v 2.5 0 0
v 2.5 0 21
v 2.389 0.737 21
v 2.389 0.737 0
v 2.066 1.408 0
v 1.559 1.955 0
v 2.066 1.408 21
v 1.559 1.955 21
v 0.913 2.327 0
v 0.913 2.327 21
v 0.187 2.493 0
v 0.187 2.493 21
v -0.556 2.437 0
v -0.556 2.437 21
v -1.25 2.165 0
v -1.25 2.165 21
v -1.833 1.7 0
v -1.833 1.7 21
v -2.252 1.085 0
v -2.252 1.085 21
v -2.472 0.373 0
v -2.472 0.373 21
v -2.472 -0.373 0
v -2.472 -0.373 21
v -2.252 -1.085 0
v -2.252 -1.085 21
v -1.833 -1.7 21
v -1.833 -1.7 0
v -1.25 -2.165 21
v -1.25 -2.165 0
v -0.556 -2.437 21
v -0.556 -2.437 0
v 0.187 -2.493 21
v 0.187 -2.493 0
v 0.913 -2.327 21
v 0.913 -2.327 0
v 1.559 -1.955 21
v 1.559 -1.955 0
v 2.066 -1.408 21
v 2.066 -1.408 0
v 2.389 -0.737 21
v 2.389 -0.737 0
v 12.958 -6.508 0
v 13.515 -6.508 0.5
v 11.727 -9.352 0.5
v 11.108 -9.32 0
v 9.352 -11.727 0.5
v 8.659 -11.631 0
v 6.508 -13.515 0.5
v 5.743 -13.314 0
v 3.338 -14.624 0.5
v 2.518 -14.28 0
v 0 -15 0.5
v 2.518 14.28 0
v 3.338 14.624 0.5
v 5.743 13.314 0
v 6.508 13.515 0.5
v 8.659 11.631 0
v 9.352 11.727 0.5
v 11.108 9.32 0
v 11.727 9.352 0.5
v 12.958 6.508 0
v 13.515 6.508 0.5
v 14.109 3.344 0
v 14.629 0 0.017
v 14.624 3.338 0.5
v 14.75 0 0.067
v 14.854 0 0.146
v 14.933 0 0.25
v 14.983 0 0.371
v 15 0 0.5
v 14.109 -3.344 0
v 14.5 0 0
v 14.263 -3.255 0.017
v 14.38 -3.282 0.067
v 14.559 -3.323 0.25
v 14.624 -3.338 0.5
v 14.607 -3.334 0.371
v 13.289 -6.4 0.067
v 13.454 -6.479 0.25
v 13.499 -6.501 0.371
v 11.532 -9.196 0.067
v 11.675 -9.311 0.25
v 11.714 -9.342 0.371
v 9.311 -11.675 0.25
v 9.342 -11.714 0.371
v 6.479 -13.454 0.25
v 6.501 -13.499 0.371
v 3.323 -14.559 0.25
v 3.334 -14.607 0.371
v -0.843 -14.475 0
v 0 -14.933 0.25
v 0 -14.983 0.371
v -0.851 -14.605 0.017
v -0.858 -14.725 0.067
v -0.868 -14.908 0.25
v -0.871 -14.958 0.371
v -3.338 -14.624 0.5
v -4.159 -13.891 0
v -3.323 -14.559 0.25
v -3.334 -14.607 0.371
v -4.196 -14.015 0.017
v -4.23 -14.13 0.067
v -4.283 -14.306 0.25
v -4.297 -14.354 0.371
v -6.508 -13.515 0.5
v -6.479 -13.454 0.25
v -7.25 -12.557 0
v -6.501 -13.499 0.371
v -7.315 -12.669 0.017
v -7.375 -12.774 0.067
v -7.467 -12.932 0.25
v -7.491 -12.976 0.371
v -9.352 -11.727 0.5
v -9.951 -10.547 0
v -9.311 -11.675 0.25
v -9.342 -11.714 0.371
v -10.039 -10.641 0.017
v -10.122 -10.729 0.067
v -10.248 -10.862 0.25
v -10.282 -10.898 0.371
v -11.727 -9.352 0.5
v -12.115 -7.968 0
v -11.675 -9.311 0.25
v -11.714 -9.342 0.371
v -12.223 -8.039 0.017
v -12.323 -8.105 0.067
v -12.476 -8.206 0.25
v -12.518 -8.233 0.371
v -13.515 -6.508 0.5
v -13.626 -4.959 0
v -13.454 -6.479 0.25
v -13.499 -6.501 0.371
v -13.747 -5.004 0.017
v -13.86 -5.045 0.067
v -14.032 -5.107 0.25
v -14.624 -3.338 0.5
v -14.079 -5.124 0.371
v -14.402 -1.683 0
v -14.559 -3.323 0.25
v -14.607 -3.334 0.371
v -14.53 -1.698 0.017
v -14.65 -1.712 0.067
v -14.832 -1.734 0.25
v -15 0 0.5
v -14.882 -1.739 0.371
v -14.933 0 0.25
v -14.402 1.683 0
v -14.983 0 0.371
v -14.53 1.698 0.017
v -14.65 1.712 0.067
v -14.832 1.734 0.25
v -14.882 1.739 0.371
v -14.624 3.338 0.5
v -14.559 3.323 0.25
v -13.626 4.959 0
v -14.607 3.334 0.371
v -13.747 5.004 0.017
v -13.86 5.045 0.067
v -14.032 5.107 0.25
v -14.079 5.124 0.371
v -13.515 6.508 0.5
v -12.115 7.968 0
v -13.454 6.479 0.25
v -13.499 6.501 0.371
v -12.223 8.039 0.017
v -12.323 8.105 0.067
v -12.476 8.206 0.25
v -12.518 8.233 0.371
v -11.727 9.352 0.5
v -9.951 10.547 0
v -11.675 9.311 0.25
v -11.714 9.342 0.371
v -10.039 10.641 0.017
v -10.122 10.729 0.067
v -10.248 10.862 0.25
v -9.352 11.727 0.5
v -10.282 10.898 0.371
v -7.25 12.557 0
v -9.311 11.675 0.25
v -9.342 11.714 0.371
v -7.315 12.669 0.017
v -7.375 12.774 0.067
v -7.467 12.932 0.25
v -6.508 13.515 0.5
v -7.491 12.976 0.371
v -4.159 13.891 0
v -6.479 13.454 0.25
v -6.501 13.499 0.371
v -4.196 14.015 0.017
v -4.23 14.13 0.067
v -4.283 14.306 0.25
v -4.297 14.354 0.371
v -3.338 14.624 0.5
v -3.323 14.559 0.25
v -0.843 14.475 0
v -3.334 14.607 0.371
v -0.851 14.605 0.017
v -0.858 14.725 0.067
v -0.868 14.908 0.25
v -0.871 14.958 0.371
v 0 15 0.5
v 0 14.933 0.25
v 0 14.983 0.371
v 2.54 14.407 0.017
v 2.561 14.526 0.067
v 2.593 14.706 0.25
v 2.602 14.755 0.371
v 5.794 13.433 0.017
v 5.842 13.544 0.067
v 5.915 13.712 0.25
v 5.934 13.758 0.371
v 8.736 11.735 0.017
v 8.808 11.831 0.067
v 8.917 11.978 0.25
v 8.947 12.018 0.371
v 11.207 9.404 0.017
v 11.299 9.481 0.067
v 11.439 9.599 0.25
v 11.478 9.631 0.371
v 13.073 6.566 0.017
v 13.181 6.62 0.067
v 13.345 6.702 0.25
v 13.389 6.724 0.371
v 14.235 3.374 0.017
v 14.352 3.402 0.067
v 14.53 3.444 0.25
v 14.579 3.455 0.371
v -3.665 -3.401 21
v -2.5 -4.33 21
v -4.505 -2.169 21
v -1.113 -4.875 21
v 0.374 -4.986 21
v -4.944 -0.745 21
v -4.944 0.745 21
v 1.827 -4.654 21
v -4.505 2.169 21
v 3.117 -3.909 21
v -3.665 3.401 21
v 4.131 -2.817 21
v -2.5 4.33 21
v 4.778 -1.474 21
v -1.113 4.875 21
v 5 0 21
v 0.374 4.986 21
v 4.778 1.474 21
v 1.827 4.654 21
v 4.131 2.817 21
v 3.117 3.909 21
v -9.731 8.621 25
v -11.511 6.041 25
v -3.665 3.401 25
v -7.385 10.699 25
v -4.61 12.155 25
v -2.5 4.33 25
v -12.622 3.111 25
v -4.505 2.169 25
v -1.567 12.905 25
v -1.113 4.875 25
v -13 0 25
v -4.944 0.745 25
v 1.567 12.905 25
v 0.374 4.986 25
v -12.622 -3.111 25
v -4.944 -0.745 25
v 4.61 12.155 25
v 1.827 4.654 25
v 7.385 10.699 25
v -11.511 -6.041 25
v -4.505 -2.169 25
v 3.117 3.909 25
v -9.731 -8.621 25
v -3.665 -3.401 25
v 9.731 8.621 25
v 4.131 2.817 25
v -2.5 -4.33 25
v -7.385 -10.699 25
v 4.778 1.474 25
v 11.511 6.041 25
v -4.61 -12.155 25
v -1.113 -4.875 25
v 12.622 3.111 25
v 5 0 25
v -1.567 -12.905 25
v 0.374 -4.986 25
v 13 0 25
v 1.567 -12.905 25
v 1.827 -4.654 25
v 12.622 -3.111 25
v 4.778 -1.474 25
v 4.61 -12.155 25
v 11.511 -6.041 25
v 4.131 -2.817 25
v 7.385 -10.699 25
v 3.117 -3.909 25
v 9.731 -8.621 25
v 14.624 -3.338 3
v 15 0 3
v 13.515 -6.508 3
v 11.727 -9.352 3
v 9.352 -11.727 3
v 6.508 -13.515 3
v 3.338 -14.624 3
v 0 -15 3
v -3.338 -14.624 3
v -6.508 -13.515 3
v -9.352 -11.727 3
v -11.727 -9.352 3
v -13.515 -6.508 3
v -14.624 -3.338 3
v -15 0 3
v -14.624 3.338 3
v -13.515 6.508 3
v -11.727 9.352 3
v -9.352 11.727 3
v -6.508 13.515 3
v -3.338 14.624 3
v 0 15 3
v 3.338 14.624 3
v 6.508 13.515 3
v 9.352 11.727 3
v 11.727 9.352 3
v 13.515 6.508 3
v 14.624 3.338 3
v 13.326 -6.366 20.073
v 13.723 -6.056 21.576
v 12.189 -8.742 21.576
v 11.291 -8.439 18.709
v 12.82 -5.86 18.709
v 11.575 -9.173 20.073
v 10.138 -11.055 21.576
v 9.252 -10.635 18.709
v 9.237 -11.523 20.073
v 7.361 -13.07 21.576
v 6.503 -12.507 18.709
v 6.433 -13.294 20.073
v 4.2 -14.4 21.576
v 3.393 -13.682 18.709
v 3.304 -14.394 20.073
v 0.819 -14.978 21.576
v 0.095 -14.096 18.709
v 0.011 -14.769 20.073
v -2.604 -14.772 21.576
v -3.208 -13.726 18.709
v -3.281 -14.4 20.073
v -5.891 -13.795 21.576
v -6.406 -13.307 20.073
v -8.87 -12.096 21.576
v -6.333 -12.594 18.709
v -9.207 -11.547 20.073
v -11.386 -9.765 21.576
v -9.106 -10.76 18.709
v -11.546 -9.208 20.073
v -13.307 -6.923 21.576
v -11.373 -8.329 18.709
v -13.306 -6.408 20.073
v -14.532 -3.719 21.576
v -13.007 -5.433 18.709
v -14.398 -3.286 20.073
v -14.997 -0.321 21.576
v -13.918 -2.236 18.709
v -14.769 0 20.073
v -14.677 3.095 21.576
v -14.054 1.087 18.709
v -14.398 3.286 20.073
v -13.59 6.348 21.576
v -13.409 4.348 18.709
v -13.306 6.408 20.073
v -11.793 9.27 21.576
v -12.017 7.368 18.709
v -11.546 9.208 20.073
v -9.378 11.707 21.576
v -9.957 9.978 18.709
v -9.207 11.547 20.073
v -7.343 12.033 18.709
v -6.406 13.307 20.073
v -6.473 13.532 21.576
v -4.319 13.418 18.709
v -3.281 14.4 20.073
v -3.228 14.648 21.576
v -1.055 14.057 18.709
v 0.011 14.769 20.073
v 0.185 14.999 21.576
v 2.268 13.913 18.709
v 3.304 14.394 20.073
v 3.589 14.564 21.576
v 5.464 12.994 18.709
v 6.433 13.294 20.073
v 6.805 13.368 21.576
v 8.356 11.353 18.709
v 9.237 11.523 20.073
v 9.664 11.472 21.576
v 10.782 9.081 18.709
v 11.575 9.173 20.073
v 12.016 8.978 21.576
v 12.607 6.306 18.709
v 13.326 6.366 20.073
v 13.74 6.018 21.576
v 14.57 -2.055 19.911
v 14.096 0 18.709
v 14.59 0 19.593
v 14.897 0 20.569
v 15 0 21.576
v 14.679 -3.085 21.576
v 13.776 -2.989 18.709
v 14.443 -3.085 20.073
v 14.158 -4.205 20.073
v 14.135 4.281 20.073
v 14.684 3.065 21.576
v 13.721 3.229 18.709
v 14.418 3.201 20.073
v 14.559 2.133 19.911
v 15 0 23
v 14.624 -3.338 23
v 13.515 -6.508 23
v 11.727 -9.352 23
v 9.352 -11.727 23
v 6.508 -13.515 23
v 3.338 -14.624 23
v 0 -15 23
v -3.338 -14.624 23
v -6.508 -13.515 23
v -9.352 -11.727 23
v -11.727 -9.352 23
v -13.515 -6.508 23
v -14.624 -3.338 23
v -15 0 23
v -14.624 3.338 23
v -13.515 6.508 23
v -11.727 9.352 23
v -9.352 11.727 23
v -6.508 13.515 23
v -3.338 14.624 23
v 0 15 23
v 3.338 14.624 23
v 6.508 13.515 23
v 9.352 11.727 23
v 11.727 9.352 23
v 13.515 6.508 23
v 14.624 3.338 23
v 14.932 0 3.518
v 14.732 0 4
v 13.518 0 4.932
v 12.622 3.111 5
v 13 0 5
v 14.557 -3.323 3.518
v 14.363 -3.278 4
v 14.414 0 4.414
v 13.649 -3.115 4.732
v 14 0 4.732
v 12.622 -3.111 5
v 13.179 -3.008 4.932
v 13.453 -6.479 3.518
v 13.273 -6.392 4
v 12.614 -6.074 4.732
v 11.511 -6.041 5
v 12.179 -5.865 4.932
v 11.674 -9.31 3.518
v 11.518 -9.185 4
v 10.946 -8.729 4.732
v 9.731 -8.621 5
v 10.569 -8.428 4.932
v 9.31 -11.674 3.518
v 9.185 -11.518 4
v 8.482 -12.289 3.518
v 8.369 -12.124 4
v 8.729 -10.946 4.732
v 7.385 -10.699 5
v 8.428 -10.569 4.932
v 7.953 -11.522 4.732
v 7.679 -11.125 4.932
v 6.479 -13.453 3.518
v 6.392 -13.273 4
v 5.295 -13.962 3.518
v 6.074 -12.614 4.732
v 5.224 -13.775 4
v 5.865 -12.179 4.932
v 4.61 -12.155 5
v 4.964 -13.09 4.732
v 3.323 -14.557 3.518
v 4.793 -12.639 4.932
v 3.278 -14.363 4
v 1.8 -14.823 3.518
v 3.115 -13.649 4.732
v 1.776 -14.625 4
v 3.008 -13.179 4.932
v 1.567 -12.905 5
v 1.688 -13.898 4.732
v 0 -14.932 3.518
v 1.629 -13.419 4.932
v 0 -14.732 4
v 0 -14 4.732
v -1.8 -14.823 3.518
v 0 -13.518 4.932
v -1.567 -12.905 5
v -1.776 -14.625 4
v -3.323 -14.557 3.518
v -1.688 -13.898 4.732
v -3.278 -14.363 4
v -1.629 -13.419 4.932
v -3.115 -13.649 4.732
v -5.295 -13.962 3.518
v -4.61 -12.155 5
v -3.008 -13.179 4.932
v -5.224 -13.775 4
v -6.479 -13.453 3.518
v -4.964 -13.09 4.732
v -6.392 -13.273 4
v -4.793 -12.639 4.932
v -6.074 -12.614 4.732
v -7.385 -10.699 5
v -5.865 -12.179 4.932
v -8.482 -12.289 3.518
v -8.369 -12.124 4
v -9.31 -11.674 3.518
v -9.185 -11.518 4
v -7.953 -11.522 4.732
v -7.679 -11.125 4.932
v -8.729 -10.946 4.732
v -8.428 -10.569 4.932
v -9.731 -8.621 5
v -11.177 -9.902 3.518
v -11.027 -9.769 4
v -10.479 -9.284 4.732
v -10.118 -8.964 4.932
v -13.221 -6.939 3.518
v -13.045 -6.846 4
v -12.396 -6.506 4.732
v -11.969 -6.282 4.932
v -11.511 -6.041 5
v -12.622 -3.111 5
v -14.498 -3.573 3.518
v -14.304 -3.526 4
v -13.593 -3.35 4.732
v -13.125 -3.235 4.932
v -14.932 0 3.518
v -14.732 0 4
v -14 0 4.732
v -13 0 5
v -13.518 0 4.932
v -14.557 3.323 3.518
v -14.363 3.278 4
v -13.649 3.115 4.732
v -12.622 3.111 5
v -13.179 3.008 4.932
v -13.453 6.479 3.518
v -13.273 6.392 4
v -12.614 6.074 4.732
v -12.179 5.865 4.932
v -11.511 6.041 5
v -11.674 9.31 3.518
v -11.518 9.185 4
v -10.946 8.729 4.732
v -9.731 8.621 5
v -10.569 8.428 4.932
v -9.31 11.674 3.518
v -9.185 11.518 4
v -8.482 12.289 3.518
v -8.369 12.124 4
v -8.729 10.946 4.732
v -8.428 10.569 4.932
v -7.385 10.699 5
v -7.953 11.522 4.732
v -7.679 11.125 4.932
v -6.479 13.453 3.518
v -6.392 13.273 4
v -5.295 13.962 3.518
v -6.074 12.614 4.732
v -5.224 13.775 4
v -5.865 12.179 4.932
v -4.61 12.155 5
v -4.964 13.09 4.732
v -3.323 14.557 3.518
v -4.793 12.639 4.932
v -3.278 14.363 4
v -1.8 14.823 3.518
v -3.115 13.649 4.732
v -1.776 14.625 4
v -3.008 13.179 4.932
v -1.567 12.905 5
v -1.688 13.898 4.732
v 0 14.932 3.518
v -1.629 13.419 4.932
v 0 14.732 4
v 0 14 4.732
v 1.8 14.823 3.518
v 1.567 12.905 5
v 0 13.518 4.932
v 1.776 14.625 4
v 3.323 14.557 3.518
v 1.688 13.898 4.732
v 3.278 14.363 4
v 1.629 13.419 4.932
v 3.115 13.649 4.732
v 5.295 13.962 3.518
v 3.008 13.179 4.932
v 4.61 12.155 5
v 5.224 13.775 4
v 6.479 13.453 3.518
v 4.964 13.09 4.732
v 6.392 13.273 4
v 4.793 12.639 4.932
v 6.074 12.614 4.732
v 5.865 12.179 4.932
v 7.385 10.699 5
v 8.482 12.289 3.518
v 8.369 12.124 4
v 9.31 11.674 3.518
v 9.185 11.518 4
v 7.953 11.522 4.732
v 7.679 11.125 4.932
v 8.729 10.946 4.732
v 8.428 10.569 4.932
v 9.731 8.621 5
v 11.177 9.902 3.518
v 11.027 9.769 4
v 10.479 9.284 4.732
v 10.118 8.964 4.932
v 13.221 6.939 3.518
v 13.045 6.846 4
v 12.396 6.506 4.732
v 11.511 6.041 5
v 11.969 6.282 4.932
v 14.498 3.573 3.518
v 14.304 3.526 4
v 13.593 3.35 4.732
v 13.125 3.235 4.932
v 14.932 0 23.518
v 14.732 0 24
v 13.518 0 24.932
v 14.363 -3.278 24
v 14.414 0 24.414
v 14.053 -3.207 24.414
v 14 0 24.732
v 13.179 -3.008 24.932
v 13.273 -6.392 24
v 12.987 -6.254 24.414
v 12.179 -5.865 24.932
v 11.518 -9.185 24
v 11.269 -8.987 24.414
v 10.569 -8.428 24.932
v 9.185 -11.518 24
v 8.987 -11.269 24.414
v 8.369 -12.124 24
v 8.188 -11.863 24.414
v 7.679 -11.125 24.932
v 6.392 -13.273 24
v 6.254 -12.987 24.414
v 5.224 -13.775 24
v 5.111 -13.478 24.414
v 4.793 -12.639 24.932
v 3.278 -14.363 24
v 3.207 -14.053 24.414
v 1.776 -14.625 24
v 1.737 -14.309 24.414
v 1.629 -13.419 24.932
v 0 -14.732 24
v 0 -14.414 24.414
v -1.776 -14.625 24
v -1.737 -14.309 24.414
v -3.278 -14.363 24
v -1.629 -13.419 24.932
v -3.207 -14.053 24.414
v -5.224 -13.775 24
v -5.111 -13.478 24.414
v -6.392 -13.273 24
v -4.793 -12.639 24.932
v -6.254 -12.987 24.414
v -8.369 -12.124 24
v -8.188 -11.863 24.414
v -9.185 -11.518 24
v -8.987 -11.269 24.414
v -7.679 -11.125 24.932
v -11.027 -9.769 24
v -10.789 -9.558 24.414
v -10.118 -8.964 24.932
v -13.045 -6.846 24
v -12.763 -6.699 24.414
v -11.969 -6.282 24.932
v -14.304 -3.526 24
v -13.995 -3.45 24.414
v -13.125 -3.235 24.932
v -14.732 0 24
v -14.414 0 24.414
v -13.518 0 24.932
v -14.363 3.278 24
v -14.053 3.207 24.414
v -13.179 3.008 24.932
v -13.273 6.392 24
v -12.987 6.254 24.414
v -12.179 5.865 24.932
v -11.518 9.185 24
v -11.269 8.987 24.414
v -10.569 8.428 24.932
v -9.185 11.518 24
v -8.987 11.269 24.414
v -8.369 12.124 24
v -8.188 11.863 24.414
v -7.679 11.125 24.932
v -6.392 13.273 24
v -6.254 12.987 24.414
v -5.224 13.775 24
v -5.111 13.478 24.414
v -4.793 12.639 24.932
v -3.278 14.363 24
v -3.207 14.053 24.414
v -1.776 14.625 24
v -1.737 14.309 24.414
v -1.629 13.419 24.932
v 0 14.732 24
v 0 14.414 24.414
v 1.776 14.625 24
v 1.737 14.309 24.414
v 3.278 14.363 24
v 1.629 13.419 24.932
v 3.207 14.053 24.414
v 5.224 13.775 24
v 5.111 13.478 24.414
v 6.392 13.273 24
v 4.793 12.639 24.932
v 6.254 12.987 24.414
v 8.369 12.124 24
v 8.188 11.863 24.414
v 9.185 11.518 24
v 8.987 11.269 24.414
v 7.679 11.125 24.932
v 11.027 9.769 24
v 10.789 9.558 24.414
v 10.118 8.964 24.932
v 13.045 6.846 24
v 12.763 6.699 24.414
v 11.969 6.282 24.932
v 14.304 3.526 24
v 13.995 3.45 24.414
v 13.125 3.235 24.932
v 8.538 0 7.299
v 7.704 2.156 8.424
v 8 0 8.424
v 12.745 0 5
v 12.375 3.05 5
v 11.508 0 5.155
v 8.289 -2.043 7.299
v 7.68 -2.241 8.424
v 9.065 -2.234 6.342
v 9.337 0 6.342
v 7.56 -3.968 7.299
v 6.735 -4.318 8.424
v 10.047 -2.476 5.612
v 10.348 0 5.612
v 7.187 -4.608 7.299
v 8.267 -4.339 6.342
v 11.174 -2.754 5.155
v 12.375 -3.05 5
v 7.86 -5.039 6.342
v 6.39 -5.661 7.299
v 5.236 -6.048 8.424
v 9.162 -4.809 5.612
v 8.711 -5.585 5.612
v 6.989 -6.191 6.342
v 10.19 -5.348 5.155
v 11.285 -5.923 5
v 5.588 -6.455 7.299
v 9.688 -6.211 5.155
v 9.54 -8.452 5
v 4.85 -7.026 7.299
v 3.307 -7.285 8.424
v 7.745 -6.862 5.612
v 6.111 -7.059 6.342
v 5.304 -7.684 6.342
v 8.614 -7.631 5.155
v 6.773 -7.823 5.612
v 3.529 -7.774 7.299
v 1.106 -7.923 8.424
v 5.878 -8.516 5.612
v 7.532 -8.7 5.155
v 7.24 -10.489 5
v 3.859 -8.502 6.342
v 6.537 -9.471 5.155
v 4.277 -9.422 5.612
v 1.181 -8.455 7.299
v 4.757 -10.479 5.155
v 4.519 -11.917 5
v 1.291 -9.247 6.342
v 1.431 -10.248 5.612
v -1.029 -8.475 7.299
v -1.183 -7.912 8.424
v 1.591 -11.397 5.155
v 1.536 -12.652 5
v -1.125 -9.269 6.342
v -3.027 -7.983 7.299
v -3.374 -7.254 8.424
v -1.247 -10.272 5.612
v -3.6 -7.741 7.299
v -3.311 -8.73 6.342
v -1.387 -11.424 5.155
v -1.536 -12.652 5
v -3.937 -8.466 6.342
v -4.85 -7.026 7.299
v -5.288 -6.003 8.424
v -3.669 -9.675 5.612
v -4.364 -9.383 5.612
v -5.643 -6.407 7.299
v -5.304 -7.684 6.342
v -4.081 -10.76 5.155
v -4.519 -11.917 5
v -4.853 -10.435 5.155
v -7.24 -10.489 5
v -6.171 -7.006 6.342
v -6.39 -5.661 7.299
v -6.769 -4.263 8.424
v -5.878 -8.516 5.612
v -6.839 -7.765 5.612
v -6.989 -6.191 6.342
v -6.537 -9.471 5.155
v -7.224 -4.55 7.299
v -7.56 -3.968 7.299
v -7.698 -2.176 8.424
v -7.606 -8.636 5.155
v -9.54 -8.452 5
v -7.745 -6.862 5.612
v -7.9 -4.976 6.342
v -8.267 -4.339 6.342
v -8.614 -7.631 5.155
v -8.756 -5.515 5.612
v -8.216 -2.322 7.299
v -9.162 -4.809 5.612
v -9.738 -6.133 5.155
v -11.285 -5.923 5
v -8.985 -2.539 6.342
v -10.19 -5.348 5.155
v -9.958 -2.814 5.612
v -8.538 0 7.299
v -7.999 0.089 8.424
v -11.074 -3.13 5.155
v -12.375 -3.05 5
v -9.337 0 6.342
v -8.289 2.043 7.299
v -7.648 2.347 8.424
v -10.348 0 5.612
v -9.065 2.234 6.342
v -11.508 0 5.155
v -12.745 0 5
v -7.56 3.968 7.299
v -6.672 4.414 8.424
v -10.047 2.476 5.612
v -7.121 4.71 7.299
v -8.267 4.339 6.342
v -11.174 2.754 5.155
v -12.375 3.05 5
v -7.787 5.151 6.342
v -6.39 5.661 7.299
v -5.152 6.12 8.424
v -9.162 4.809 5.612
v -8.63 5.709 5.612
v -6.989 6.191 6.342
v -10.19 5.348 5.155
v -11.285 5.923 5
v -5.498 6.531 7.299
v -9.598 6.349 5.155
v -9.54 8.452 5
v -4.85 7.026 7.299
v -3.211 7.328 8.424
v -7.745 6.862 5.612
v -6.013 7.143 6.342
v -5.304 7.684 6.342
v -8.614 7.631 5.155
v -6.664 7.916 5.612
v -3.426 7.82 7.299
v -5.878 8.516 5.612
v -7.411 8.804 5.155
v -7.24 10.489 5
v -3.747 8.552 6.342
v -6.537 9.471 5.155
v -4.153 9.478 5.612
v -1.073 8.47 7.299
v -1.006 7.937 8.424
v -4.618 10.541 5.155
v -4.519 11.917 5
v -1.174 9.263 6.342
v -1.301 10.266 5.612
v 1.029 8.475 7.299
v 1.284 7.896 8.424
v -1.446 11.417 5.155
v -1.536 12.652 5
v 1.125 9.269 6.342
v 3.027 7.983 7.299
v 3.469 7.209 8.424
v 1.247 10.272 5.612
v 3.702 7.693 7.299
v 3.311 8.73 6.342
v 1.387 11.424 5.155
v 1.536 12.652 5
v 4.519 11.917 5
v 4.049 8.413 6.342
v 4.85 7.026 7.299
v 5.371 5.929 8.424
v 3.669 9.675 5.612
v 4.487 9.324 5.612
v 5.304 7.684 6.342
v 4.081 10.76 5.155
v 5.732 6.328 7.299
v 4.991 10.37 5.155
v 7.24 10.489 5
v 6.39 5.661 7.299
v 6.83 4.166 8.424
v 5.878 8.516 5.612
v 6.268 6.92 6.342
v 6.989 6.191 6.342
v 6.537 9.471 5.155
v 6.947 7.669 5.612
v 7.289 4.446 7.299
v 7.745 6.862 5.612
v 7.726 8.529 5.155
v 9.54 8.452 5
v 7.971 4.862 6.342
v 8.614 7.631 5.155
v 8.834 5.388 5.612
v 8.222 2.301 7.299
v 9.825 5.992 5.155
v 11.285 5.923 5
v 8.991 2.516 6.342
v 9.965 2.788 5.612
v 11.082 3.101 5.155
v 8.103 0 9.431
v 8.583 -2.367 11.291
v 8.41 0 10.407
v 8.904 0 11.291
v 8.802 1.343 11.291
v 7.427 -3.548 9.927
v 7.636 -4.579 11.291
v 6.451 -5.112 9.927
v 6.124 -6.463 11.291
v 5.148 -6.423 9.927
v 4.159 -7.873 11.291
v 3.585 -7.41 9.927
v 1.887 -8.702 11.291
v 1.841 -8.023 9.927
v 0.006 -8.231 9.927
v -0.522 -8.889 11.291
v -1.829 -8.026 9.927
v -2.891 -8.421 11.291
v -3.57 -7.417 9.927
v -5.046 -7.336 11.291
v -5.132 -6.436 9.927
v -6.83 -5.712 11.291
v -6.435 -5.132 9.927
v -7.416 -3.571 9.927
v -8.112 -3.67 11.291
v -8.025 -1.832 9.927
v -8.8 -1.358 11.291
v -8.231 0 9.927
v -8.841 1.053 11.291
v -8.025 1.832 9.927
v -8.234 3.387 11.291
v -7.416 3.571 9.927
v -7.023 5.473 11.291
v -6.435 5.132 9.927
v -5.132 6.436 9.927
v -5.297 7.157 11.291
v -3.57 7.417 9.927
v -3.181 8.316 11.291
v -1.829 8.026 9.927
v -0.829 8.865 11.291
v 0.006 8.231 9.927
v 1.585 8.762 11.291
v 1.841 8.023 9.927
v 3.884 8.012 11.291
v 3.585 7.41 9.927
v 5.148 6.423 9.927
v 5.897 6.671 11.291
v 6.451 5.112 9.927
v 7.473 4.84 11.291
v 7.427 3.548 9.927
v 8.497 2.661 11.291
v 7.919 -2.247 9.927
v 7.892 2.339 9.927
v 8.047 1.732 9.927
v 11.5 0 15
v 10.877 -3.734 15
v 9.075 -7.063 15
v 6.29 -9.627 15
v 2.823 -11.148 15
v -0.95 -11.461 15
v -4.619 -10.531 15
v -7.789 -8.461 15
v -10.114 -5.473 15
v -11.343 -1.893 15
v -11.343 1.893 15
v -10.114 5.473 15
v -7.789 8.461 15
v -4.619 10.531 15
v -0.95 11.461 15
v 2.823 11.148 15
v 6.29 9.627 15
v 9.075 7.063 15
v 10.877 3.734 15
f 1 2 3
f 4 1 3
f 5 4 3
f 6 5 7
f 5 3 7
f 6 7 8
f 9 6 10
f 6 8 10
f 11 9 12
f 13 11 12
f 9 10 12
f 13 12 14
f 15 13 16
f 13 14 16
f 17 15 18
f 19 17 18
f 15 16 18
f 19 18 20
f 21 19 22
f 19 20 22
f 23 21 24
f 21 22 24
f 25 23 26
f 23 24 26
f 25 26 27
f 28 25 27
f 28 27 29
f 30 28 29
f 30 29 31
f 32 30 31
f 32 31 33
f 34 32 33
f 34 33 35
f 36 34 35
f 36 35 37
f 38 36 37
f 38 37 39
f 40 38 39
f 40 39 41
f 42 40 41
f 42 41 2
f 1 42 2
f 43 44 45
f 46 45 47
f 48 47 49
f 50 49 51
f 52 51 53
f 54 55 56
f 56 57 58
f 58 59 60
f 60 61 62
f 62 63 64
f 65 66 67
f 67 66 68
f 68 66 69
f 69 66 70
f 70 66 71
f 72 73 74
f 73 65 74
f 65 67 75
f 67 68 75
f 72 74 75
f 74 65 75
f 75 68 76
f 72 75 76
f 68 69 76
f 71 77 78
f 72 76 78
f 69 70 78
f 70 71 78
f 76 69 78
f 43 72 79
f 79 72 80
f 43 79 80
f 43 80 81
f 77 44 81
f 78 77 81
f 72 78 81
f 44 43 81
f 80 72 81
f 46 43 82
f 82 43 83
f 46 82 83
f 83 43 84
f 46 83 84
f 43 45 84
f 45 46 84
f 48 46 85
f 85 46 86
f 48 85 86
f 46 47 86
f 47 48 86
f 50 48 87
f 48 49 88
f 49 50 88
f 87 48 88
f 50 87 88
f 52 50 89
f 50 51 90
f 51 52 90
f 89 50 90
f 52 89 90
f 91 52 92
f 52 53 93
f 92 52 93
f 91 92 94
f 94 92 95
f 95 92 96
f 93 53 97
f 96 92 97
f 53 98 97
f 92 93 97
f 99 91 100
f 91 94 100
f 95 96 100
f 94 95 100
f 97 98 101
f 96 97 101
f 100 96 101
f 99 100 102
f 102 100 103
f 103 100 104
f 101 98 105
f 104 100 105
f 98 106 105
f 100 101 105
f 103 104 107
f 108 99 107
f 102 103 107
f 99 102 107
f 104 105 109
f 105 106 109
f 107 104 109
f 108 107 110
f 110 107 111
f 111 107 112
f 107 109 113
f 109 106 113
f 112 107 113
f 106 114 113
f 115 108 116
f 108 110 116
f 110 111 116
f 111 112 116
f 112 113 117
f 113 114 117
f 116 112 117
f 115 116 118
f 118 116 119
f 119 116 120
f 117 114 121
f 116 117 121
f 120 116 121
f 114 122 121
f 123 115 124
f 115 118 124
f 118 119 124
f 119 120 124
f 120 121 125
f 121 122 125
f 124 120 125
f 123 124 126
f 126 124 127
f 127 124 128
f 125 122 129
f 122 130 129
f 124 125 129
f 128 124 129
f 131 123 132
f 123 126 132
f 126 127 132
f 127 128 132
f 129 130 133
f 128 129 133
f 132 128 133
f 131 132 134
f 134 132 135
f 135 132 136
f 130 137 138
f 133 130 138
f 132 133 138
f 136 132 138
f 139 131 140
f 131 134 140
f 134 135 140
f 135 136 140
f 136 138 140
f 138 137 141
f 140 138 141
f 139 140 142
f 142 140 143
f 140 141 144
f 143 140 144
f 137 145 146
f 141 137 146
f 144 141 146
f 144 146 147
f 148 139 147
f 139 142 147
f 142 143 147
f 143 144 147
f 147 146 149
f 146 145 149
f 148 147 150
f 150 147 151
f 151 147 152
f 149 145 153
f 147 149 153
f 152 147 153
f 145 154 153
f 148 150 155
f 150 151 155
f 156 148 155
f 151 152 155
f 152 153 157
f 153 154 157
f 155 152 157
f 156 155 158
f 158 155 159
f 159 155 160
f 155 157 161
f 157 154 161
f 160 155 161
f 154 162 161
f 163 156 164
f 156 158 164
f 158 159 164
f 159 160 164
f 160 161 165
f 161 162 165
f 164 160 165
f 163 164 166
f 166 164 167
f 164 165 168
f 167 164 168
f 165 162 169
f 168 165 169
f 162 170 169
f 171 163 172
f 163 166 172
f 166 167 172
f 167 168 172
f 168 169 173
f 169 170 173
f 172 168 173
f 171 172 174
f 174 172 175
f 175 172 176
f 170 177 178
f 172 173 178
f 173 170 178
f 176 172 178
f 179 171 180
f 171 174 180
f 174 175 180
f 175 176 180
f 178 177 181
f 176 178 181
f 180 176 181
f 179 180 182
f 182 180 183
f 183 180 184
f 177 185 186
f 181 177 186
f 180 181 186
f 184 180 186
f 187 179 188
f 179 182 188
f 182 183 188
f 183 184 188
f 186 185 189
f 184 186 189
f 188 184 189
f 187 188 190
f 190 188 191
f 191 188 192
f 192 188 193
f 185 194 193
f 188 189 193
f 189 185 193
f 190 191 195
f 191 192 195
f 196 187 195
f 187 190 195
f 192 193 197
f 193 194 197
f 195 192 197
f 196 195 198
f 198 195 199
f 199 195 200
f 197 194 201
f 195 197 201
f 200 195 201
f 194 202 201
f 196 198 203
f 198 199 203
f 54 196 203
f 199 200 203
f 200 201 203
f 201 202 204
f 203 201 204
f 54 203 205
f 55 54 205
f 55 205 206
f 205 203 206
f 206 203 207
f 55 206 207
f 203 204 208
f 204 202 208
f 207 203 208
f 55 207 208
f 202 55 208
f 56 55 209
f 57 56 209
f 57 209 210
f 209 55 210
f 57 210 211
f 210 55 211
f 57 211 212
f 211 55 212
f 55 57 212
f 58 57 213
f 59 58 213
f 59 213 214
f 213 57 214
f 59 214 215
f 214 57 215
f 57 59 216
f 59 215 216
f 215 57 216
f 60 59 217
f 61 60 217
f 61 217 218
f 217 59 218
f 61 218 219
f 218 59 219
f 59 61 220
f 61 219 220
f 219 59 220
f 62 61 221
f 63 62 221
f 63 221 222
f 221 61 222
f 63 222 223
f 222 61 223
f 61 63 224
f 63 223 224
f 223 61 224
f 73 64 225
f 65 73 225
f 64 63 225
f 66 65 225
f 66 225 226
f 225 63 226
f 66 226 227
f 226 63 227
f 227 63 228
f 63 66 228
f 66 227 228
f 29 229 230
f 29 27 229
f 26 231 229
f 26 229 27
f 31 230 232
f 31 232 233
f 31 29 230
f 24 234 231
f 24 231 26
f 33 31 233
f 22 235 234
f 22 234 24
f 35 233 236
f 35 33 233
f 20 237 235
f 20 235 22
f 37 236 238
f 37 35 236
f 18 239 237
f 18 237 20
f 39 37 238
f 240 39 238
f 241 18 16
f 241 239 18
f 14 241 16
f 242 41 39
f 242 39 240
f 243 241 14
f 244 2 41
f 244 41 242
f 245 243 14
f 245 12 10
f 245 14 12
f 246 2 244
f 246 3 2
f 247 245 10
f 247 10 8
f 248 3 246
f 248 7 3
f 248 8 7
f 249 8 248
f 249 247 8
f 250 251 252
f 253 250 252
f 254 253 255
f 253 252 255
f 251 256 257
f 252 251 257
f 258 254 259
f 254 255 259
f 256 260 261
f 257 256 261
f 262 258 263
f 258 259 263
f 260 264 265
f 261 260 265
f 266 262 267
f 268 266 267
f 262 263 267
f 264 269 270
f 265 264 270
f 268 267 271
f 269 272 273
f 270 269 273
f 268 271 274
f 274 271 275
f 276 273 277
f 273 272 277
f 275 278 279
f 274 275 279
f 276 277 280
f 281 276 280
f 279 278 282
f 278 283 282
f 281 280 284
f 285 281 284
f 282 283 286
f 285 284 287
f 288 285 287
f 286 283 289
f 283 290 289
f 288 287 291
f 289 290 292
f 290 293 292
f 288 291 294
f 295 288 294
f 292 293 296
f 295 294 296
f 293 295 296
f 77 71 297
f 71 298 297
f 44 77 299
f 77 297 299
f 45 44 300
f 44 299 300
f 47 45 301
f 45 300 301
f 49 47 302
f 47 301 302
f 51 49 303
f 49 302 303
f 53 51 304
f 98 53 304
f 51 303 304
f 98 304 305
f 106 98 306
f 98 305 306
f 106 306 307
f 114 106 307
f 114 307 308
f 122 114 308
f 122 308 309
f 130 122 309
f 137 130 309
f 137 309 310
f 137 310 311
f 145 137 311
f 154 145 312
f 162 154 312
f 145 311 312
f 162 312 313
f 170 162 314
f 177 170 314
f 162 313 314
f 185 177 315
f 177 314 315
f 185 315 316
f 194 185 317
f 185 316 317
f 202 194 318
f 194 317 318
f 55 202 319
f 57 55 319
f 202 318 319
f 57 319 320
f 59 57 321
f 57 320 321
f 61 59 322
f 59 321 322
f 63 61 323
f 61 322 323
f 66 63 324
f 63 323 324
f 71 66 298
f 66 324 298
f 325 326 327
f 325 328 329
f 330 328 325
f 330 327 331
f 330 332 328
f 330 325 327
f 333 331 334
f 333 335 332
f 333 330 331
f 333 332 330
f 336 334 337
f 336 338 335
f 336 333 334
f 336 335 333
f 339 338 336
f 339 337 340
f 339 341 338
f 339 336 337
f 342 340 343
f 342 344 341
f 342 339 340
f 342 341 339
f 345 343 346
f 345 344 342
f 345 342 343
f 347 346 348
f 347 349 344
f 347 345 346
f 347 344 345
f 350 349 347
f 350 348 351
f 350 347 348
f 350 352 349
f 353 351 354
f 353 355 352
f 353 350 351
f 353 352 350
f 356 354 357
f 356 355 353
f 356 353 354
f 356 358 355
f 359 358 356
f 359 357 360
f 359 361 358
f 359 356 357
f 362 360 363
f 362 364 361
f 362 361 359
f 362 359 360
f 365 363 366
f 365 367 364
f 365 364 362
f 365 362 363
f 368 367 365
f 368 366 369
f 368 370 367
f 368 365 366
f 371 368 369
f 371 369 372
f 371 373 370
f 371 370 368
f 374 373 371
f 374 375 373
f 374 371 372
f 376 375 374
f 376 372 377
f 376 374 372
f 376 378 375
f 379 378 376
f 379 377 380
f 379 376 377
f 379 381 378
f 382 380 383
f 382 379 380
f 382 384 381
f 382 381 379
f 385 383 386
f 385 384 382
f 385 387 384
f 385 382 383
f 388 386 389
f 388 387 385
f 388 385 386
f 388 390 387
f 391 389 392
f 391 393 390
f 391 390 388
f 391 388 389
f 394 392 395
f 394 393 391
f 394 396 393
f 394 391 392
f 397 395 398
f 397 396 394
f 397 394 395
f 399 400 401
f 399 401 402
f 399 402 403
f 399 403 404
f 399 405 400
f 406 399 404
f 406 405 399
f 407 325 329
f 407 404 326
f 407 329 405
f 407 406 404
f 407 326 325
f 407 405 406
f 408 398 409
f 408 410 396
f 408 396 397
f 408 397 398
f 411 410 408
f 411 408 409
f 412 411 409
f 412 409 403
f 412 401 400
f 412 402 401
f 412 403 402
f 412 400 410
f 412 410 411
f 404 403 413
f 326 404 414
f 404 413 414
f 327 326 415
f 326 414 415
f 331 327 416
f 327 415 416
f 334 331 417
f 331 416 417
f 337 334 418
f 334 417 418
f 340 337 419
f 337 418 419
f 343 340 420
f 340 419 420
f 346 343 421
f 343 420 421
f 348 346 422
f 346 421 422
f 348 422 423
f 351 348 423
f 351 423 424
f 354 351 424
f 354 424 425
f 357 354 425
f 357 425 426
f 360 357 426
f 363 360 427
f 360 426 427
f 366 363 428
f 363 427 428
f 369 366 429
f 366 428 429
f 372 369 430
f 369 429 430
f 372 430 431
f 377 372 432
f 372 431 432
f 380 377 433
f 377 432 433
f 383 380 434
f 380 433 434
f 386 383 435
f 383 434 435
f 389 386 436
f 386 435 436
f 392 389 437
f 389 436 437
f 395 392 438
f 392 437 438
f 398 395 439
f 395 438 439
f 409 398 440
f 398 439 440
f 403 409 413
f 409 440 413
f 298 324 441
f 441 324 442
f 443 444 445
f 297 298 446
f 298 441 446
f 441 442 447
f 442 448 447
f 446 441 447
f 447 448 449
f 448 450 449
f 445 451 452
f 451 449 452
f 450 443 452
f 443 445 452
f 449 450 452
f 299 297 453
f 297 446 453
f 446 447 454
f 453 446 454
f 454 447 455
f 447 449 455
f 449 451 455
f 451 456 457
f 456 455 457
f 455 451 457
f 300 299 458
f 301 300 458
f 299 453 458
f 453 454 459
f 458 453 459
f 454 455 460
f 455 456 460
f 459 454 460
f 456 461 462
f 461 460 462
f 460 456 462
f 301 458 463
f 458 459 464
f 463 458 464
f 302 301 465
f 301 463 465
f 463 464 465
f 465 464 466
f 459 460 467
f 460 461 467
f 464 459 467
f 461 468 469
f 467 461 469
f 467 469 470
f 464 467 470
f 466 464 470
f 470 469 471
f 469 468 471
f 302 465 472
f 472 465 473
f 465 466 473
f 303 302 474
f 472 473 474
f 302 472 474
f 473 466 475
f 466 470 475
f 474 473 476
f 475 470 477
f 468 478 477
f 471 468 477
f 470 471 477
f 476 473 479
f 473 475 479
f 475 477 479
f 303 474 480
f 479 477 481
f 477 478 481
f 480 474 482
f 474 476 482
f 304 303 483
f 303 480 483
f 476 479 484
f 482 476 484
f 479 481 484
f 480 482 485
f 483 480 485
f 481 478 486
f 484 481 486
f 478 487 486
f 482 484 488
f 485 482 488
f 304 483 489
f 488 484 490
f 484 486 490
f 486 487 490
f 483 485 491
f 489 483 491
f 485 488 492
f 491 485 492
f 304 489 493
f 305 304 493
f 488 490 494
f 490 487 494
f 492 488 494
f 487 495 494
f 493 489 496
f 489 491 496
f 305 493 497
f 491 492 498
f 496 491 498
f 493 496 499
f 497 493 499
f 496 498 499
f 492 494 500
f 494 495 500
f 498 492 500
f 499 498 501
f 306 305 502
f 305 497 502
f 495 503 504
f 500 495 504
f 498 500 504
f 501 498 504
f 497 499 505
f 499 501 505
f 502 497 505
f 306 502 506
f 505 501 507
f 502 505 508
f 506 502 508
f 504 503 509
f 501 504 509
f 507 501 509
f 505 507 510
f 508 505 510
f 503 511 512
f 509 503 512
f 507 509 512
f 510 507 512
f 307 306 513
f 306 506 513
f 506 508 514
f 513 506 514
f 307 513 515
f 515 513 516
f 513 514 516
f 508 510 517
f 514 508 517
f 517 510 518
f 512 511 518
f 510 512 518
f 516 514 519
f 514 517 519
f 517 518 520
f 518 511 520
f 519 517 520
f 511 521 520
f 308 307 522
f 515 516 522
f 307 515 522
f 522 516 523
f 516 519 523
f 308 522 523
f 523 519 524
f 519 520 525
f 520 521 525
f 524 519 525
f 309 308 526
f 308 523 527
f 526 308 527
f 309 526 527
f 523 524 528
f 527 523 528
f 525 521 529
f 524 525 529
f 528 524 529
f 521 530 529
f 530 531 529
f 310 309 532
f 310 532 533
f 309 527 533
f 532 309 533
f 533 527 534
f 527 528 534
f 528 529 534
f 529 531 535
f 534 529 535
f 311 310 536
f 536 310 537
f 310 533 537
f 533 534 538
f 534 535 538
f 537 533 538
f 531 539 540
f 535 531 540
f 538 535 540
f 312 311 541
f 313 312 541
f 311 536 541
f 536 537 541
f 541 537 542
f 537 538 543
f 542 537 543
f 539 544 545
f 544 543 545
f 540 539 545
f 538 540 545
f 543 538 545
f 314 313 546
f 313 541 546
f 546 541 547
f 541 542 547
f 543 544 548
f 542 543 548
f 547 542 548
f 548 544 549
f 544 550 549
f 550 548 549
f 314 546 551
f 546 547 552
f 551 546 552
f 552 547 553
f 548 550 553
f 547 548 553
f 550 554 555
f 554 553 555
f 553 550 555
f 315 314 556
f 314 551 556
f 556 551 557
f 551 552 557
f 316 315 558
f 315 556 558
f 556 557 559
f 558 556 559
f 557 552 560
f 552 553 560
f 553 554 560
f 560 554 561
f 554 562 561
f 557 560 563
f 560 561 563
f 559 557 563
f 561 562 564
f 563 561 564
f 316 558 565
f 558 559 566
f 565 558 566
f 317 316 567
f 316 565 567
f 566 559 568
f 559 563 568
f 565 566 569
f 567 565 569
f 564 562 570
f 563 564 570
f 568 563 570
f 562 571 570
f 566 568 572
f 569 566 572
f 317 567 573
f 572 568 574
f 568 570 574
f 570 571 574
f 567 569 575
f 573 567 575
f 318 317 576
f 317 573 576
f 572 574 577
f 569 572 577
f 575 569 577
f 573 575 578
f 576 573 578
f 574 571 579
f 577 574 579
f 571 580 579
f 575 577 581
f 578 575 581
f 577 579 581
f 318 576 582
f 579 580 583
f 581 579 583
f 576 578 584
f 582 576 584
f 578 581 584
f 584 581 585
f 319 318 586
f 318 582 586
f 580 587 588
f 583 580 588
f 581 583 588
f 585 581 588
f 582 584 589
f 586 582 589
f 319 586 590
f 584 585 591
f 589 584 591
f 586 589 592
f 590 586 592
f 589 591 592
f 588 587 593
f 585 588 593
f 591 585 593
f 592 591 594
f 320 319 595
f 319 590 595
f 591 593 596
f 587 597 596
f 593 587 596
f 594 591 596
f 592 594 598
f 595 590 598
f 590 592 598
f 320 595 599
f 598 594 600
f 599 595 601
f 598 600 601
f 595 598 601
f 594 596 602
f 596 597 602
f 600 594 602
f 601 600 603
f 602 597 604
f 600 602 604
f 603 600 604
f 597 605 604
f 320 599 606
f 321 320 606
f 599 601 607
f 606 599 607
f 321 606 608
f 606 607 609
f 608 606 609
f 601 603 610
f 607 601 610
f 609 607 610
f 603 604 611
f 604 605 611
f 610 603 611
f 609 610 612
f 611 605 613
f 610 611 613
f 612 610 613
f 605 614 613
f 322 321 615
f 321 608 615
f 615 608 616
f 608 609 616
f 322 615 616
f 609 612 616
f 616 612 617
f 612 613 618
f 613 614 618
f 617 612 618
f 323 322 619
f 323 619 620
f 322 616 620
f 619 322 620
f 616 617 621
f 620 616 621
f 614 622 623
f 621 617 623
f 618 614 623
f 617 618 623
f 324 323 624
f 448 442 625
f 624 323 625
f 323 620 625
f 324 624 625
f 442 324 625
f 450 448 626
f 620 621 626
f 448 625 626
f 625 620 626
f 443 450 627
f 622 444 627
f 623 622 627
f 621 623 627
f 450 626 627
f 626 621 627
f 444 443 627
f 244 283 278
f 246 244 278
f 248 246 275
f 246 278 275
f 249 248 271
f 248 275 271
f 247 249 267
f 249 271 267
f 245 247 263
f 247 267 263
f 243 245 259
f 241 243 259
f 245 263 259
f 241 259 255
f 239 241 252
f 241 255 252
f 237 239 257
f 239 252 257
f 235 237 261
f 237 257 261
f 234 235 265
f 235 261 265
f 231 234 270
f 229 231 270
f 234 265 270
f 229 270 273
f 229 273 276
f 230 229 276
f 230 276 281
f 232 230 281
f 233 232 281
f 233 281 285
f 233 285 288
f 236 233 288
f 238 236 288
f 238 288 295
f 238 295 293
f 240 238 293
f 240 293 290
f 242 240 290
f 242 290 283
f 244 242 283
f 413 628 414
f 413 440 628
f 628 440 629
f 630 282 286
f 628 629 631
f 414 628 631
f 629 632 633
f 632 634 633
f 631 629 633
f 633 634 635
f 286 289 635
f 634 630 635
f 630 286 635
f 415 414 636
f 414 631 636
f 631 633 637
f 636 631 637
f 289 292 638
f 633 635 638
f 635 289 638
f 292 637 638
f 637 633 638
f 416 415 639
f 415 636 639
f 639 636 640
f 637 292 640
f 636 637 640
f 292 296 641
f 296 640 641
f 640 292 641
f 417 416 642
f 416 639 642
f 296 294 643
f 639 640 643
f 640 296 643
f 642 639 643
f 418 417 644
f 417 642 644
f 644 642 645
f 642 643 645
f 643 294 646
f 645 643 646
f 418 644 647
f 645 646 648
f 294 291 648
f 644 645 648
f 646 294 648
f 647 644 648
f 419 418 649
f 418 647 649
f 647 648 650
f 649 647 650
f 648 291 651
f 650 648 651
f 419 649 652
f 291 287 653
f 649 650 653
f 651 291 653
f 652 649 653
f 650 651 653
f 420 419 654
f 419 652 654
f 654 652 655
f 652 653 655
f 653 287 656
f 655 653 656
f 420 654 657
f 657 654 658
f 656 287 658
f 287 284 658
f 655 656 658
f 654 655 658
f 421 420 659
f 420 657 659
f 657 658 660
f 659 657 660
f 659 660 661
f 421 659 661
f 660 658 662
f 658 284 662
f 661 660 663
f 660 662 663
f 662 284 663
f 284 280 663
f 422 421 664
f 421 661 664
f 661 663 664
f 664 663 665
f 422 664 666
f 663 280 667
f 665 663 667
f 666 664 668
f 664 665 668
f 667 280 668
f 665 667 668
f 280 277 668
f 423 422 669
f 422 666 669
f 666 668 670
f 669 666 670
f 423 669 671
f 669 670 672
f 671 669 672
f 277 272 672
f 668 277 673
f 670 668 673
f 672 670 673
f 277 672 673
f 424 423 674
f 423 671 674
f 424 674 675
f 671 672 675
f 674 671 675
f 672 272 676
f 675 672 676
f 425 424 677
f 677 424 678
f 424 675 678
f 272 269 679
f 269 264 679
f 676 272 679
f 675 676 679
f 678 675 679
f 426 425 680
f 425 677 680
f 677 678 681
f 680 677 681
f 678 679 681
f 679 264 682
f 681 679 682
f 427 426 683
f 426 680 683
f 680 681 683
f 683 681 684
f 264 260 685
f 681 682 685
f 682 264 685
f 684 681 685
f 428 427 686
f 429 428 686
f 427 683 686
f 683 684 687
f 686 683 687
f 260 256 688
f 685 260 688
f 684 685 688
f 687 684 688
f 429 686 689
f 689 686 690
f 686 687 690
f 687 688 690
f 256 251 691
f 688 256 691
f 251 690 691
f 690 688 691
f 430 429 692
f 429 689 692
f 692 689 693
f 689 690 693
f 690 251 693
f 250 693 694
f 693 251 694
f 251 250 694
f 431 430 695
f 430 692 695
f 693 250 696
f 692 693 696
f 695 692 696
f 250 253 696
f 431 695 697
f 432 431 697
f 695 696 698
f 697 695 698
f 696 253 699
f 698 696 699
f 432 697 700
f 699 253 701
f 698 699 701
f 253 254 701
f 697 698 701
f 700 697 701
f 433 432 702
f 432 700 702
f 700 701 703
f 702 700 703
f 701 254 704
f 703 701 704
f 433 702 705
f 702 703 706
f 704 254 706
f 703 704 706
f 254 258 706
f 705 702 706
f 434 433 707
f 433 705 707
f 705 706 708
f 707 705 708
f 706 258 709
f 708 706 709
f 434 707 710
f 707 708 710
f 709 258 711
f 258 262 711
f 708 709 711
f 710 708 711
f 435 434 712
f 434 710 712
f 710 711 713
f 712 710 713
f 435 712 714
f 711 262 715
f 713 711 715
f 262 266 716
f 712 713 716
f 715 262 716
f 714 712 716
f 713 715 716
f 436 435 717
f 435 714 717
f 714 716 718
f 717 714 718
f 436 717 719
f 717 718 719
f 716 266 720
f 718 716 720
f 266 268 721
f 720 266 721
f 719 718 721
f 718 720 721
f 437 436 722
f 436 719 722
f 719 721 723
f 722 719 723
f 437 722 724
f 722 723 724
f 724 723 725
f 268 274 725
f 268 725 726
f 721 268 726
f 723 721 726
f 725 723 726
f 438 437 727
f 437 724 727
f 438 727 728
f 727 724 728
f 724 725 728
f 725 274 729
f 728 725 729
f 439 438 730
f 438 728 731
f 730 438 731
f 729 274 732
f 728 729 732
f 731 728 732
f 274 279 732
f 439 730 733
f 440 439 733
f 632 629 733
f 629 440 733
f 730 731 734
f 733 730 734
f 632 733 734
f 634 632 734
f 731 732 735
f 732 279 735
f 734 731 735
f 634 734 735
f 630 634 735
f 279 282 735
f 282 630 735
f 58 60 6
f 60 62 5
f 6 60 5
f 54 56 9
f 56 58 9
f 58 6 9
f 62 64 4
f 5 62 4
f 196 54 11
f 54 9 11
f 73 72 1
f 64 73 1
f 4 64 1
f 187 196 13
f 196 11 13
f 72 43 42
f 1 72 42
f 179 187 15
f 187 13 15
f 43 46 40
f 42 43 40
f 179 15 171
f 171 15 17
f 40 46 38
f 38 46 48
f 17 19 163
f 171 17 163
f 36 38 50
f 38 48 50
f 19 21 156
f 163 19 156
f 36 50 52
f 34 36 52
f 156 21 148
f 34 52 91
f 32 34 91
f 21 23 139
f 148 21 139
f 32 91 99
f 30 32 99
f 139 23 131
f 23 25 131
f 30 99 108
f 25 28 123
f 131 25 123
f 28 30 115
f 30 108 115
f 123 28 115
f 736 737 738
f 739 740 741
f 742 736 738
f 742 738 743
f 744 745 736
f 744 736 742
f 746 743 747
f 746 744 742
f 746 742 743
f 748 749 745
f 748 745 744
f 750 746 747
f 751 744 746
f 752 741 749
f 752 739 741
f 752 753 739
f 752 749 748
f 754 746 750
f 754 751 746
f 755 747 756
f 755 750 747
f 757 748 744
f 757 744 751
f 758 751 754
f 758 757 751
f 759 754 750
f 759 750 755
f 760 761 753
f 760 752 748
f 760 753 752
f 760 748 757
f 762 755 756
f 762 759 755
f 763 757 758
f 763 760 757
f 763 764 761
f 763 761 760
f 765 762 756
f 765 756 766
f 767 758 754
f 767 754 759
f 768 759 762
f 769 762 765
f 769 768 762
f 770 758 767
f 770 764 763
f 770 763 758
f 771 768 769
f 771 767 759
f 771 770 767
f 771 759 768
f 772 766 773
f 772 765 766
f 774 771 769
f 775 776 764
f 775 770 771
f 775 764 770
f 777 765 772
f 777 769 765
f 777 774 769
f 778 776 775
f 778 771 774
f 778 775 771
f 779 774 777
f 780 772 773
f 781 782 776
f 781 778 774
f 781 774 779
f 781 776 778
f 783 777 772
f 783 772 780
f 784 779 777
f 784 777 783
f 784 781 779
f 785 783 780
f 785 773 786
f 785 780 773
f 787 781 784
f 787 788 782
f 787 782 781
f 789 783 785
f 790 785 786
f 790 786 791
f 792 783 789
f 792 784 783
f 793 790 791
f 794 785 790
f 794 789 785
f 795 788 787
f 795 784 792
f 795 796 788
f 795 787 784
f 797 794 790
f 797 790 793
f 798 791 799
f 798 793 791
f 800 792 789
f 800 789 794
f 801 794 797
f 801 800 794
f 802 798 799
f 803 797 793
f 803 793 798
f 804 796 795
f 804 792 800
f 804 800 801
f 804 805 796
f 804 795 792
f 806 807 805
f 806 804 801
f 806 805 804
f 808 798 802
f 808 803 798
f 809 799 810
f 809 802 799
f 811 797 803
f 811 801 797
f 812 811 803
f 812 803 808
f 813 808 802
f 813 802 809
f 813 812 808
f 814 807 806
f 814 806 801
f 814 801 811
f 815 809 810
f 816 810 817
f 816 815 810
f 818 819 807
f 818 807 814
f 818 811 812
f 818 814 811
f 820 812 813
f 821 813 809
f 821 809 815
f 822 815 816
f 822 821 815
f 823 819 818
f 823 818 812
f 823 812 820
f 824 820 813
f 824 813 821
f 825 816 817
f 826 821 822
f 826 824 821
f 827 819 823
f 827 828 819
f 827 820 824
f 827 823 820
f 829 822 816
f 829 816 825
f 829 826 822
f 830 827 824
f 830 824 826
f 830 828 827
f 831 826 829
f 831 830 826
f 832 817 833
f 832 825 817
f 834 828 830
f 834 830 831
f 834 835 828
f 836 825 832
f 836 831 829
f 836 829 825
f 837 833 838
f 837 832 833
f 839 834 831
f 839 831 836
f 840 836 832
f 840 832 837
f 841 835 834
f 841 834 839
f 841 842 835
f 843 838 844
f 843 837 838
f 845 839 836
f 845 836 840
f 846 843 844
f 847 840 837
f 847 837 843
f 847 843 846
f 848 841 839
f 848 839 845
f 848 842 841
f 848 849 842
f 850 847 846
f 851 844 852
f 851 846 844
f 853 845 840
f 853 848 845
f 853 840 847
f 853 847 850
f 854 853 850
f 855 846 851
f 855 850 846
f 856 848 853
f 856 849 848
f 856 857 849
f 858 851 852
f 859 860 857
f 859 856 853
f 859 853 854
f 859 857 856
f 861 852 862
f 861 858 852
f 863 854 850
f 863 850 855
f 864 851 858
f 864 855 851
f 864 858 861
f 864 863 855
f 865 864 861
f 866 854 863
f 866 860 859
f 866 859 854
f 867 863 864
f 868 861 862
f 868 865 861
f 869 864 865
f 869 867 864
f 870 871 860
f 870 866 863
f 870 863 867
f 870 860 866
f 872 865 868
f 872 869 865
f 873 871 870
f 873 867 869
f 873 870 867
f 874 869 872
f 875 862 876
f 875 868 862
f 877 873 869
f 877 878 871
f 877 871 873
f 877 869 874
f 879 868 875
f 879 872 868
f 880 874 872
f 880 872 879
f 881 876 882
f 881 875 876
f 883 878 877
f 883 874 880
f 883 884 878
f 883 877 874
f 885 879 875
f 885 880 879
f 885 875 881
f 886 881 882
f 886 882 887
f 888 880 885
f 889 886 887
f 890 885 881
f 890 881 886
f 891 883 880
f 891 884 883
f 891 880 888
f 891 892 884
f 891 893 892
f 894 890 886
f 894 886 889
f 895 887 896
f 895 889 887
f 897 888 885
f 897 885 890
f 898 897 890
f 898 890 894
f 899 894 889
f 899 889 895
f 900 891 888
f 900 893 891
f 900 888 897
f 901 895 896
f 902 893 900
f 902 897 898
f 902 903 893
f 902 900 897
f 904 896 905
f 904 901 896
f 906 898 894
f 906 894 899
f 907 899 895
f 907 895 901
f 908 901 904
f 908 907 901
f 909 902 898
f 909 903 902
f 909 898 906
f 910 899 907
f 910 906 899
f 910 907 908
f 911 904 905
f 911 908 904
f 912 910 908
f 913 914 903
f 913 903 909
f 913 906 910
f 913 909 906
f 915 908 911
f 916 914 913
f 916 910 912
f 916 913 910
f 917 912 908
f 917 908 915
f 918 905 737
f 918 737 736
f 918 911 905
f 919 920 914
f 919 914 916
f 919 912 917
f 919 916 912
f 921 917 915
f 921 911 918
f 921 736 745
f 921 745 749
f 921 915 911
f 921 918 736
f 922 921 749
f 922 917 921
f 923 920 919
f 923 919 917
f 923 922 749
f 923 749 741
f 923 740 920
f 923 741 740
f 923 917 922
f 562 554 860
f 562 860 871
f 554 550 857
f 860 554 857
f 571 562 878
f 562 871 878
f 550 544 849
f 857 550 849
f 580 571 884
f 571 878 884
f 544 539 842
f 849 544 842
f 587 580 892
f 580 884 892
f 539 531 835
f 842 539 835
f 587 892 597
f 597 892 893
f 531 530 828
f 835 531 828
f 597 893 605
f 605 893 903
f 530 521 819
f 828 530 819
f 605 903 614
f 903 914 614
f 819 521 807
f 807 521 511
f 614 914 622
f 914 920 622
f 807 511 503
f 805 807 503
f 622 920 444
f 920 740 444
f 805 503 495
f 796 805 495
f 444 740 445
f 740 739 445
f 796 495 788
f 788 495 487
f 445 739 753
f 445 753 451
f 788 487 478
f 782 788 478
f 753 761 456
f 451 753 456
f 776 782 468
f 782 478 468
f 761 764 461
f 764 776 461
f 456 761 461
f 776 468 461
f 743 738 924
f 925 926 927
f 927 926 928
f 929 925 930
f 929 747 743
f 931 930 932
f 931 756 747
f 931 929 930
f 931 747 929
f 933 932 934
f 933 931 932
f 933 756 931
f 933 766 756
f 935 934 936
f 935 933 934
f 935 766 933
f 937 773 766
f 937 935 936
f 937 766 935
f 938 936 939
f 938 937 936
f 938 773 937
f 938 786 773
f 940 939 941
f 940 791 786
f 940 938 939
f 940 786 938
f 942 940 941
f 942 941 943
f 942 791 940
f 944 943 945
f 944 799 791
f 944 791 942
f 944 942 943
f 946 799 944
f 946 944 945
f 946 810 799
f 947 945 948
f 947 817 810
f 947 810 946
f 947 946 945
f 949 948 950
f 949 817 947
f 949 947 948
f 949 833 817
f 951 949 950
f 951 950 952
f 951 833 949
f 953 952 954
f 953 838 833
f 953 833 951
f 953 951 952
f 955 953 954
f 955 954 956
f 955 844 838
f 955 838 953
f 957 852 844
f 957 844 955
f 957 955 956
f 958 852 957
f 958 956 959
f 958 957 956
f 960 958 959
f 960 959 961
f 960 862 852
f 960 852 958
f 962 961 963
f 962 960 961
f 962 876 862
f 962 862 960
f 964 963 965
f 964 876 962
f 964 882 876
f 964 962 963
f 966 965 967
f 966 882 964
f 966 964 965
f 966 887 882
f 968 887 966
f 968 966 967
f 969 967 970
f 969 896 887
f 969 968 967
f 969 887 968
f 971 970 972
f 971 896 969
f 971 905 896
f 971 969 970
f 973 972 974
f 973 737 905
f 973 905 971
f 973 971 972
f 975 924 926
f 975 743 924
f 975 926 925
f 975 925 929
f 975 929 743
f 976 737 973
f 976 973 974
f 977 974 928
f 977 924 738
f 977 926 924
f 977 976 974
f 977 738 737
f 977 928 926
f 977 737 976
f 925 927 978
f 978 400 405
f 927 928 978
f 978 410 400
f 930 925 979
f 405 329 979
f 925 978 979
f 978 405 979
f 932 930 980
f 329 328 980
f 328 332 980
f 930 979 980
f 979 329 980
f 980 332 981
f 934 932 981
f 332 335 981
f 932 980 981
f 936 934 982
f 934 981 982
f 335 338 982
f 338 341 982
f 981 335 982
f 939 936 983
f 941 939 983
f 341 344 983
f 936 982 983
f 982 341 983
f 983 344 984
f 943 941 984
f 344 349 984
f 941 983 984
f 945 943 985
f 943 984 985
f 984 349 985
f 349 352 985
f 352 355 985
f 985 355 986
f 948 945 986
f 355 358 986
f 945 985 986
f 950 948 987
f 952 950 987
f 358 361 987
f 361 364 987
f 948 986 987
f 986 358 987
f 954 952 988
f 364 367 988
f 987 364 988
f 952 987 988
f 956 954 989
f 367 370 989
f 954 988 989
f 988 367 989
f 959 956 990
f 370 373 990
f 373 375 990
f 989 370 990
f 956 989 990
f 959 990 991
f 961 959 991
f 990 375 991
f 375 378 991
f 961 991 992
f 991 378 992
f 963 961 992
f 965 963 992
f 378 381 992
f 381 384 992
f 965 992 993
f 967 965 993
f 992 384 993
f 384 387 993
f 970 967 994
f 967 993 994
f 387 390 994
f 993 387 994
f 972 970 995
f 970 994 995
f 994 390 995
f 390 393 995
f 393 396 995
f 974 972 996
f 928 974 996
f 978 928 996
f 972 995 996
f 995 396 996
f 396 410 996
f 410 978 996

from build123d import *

# Parameters (mm, degrees)
F2_R           = 5
F4_R           = 2.5
F5_DEPTH       = 25.001
F6_D           = 5
F6_CBORE_D     = 10
F6_CBORE_DEPTH = 4


# Not quite as in the source:
# - a fillet or chamfer that OpenCascade refuses, or shapes differently, is made with other operations: its cross-section is extruded or revolved along the edge and cut away or added


with BuildPart() as f1:
    # F0 (on Front) → F1 (revolve)
    with BuildSketch(Plane.XZ):
        with BuildLine():
            Line((0, 25), (0, 0))
            Line((0, 0), (14.5, 0))
            ThreePointArc((14.5, 0), (14.8535533906, 0.1464466094), (15, 0.5))
            Line((15, 0.5), (15, 3))
            ThreePointArc((15, 3), (14.4142135624, 4.4142135624), (13, 5))
            Line((13, 5), (8, 5))
            Line((8, 5), (8, 10))
            Line((8, 10), (15, 20))
            Line((15, 20), (15, 23))
            ThreePointArc((15, 23), (14.4142135624, 24.4142135624), (13, 25))
            Line((13, 25), (0, 25))
        make_face()
    revolve(axis=Axis((0, 0, 12.5), (0, 0, -1)))

    # F2
    f2_edges = [f1.edges().sort_by_distance(p)[0] for p in [
        (-8, 0, 10),
        (-15, 0, 20),
        (11.5, 0, 15),
    ]]
    fillet(f2_edges, radius=F2_R)

    # F3: fillet of radius 5 on 3 edges, made by hand

    # F3_s1 → F3_t2 (revolve)
    with BuildSketch(Plane.XZ):
        with BuildLine():
            ThreePointArc((7.9999979579, 8.4238888459), (9.8193871029, 5.9453387459), (12.7450873806, 5))
            Line((12.7450873806, 5), (8, 5))
            Line((8, 5), (7.9999979579, 8.4238888459))
        make_face()
    revolve(axis=Axis((0, 0, 5), (0, 0, -1)))

    # F4 (on face) → F5 (cut, through all)
    with BuildSketch(Plane.XY.offset(25)):
        Circle(F4_R)
    extrude(amount=-F5_DEPTH, mode=Mode.SUBTRACT)

    # F6 (through all)
    with Locations(Plane.XY.offset(25)):
        with Locations((0, 0)):
            CounterBoreHole(F6_D / 2, F6_CBORE_D / 2, F6_CBORE_DEPTH)


solid = f1.part
